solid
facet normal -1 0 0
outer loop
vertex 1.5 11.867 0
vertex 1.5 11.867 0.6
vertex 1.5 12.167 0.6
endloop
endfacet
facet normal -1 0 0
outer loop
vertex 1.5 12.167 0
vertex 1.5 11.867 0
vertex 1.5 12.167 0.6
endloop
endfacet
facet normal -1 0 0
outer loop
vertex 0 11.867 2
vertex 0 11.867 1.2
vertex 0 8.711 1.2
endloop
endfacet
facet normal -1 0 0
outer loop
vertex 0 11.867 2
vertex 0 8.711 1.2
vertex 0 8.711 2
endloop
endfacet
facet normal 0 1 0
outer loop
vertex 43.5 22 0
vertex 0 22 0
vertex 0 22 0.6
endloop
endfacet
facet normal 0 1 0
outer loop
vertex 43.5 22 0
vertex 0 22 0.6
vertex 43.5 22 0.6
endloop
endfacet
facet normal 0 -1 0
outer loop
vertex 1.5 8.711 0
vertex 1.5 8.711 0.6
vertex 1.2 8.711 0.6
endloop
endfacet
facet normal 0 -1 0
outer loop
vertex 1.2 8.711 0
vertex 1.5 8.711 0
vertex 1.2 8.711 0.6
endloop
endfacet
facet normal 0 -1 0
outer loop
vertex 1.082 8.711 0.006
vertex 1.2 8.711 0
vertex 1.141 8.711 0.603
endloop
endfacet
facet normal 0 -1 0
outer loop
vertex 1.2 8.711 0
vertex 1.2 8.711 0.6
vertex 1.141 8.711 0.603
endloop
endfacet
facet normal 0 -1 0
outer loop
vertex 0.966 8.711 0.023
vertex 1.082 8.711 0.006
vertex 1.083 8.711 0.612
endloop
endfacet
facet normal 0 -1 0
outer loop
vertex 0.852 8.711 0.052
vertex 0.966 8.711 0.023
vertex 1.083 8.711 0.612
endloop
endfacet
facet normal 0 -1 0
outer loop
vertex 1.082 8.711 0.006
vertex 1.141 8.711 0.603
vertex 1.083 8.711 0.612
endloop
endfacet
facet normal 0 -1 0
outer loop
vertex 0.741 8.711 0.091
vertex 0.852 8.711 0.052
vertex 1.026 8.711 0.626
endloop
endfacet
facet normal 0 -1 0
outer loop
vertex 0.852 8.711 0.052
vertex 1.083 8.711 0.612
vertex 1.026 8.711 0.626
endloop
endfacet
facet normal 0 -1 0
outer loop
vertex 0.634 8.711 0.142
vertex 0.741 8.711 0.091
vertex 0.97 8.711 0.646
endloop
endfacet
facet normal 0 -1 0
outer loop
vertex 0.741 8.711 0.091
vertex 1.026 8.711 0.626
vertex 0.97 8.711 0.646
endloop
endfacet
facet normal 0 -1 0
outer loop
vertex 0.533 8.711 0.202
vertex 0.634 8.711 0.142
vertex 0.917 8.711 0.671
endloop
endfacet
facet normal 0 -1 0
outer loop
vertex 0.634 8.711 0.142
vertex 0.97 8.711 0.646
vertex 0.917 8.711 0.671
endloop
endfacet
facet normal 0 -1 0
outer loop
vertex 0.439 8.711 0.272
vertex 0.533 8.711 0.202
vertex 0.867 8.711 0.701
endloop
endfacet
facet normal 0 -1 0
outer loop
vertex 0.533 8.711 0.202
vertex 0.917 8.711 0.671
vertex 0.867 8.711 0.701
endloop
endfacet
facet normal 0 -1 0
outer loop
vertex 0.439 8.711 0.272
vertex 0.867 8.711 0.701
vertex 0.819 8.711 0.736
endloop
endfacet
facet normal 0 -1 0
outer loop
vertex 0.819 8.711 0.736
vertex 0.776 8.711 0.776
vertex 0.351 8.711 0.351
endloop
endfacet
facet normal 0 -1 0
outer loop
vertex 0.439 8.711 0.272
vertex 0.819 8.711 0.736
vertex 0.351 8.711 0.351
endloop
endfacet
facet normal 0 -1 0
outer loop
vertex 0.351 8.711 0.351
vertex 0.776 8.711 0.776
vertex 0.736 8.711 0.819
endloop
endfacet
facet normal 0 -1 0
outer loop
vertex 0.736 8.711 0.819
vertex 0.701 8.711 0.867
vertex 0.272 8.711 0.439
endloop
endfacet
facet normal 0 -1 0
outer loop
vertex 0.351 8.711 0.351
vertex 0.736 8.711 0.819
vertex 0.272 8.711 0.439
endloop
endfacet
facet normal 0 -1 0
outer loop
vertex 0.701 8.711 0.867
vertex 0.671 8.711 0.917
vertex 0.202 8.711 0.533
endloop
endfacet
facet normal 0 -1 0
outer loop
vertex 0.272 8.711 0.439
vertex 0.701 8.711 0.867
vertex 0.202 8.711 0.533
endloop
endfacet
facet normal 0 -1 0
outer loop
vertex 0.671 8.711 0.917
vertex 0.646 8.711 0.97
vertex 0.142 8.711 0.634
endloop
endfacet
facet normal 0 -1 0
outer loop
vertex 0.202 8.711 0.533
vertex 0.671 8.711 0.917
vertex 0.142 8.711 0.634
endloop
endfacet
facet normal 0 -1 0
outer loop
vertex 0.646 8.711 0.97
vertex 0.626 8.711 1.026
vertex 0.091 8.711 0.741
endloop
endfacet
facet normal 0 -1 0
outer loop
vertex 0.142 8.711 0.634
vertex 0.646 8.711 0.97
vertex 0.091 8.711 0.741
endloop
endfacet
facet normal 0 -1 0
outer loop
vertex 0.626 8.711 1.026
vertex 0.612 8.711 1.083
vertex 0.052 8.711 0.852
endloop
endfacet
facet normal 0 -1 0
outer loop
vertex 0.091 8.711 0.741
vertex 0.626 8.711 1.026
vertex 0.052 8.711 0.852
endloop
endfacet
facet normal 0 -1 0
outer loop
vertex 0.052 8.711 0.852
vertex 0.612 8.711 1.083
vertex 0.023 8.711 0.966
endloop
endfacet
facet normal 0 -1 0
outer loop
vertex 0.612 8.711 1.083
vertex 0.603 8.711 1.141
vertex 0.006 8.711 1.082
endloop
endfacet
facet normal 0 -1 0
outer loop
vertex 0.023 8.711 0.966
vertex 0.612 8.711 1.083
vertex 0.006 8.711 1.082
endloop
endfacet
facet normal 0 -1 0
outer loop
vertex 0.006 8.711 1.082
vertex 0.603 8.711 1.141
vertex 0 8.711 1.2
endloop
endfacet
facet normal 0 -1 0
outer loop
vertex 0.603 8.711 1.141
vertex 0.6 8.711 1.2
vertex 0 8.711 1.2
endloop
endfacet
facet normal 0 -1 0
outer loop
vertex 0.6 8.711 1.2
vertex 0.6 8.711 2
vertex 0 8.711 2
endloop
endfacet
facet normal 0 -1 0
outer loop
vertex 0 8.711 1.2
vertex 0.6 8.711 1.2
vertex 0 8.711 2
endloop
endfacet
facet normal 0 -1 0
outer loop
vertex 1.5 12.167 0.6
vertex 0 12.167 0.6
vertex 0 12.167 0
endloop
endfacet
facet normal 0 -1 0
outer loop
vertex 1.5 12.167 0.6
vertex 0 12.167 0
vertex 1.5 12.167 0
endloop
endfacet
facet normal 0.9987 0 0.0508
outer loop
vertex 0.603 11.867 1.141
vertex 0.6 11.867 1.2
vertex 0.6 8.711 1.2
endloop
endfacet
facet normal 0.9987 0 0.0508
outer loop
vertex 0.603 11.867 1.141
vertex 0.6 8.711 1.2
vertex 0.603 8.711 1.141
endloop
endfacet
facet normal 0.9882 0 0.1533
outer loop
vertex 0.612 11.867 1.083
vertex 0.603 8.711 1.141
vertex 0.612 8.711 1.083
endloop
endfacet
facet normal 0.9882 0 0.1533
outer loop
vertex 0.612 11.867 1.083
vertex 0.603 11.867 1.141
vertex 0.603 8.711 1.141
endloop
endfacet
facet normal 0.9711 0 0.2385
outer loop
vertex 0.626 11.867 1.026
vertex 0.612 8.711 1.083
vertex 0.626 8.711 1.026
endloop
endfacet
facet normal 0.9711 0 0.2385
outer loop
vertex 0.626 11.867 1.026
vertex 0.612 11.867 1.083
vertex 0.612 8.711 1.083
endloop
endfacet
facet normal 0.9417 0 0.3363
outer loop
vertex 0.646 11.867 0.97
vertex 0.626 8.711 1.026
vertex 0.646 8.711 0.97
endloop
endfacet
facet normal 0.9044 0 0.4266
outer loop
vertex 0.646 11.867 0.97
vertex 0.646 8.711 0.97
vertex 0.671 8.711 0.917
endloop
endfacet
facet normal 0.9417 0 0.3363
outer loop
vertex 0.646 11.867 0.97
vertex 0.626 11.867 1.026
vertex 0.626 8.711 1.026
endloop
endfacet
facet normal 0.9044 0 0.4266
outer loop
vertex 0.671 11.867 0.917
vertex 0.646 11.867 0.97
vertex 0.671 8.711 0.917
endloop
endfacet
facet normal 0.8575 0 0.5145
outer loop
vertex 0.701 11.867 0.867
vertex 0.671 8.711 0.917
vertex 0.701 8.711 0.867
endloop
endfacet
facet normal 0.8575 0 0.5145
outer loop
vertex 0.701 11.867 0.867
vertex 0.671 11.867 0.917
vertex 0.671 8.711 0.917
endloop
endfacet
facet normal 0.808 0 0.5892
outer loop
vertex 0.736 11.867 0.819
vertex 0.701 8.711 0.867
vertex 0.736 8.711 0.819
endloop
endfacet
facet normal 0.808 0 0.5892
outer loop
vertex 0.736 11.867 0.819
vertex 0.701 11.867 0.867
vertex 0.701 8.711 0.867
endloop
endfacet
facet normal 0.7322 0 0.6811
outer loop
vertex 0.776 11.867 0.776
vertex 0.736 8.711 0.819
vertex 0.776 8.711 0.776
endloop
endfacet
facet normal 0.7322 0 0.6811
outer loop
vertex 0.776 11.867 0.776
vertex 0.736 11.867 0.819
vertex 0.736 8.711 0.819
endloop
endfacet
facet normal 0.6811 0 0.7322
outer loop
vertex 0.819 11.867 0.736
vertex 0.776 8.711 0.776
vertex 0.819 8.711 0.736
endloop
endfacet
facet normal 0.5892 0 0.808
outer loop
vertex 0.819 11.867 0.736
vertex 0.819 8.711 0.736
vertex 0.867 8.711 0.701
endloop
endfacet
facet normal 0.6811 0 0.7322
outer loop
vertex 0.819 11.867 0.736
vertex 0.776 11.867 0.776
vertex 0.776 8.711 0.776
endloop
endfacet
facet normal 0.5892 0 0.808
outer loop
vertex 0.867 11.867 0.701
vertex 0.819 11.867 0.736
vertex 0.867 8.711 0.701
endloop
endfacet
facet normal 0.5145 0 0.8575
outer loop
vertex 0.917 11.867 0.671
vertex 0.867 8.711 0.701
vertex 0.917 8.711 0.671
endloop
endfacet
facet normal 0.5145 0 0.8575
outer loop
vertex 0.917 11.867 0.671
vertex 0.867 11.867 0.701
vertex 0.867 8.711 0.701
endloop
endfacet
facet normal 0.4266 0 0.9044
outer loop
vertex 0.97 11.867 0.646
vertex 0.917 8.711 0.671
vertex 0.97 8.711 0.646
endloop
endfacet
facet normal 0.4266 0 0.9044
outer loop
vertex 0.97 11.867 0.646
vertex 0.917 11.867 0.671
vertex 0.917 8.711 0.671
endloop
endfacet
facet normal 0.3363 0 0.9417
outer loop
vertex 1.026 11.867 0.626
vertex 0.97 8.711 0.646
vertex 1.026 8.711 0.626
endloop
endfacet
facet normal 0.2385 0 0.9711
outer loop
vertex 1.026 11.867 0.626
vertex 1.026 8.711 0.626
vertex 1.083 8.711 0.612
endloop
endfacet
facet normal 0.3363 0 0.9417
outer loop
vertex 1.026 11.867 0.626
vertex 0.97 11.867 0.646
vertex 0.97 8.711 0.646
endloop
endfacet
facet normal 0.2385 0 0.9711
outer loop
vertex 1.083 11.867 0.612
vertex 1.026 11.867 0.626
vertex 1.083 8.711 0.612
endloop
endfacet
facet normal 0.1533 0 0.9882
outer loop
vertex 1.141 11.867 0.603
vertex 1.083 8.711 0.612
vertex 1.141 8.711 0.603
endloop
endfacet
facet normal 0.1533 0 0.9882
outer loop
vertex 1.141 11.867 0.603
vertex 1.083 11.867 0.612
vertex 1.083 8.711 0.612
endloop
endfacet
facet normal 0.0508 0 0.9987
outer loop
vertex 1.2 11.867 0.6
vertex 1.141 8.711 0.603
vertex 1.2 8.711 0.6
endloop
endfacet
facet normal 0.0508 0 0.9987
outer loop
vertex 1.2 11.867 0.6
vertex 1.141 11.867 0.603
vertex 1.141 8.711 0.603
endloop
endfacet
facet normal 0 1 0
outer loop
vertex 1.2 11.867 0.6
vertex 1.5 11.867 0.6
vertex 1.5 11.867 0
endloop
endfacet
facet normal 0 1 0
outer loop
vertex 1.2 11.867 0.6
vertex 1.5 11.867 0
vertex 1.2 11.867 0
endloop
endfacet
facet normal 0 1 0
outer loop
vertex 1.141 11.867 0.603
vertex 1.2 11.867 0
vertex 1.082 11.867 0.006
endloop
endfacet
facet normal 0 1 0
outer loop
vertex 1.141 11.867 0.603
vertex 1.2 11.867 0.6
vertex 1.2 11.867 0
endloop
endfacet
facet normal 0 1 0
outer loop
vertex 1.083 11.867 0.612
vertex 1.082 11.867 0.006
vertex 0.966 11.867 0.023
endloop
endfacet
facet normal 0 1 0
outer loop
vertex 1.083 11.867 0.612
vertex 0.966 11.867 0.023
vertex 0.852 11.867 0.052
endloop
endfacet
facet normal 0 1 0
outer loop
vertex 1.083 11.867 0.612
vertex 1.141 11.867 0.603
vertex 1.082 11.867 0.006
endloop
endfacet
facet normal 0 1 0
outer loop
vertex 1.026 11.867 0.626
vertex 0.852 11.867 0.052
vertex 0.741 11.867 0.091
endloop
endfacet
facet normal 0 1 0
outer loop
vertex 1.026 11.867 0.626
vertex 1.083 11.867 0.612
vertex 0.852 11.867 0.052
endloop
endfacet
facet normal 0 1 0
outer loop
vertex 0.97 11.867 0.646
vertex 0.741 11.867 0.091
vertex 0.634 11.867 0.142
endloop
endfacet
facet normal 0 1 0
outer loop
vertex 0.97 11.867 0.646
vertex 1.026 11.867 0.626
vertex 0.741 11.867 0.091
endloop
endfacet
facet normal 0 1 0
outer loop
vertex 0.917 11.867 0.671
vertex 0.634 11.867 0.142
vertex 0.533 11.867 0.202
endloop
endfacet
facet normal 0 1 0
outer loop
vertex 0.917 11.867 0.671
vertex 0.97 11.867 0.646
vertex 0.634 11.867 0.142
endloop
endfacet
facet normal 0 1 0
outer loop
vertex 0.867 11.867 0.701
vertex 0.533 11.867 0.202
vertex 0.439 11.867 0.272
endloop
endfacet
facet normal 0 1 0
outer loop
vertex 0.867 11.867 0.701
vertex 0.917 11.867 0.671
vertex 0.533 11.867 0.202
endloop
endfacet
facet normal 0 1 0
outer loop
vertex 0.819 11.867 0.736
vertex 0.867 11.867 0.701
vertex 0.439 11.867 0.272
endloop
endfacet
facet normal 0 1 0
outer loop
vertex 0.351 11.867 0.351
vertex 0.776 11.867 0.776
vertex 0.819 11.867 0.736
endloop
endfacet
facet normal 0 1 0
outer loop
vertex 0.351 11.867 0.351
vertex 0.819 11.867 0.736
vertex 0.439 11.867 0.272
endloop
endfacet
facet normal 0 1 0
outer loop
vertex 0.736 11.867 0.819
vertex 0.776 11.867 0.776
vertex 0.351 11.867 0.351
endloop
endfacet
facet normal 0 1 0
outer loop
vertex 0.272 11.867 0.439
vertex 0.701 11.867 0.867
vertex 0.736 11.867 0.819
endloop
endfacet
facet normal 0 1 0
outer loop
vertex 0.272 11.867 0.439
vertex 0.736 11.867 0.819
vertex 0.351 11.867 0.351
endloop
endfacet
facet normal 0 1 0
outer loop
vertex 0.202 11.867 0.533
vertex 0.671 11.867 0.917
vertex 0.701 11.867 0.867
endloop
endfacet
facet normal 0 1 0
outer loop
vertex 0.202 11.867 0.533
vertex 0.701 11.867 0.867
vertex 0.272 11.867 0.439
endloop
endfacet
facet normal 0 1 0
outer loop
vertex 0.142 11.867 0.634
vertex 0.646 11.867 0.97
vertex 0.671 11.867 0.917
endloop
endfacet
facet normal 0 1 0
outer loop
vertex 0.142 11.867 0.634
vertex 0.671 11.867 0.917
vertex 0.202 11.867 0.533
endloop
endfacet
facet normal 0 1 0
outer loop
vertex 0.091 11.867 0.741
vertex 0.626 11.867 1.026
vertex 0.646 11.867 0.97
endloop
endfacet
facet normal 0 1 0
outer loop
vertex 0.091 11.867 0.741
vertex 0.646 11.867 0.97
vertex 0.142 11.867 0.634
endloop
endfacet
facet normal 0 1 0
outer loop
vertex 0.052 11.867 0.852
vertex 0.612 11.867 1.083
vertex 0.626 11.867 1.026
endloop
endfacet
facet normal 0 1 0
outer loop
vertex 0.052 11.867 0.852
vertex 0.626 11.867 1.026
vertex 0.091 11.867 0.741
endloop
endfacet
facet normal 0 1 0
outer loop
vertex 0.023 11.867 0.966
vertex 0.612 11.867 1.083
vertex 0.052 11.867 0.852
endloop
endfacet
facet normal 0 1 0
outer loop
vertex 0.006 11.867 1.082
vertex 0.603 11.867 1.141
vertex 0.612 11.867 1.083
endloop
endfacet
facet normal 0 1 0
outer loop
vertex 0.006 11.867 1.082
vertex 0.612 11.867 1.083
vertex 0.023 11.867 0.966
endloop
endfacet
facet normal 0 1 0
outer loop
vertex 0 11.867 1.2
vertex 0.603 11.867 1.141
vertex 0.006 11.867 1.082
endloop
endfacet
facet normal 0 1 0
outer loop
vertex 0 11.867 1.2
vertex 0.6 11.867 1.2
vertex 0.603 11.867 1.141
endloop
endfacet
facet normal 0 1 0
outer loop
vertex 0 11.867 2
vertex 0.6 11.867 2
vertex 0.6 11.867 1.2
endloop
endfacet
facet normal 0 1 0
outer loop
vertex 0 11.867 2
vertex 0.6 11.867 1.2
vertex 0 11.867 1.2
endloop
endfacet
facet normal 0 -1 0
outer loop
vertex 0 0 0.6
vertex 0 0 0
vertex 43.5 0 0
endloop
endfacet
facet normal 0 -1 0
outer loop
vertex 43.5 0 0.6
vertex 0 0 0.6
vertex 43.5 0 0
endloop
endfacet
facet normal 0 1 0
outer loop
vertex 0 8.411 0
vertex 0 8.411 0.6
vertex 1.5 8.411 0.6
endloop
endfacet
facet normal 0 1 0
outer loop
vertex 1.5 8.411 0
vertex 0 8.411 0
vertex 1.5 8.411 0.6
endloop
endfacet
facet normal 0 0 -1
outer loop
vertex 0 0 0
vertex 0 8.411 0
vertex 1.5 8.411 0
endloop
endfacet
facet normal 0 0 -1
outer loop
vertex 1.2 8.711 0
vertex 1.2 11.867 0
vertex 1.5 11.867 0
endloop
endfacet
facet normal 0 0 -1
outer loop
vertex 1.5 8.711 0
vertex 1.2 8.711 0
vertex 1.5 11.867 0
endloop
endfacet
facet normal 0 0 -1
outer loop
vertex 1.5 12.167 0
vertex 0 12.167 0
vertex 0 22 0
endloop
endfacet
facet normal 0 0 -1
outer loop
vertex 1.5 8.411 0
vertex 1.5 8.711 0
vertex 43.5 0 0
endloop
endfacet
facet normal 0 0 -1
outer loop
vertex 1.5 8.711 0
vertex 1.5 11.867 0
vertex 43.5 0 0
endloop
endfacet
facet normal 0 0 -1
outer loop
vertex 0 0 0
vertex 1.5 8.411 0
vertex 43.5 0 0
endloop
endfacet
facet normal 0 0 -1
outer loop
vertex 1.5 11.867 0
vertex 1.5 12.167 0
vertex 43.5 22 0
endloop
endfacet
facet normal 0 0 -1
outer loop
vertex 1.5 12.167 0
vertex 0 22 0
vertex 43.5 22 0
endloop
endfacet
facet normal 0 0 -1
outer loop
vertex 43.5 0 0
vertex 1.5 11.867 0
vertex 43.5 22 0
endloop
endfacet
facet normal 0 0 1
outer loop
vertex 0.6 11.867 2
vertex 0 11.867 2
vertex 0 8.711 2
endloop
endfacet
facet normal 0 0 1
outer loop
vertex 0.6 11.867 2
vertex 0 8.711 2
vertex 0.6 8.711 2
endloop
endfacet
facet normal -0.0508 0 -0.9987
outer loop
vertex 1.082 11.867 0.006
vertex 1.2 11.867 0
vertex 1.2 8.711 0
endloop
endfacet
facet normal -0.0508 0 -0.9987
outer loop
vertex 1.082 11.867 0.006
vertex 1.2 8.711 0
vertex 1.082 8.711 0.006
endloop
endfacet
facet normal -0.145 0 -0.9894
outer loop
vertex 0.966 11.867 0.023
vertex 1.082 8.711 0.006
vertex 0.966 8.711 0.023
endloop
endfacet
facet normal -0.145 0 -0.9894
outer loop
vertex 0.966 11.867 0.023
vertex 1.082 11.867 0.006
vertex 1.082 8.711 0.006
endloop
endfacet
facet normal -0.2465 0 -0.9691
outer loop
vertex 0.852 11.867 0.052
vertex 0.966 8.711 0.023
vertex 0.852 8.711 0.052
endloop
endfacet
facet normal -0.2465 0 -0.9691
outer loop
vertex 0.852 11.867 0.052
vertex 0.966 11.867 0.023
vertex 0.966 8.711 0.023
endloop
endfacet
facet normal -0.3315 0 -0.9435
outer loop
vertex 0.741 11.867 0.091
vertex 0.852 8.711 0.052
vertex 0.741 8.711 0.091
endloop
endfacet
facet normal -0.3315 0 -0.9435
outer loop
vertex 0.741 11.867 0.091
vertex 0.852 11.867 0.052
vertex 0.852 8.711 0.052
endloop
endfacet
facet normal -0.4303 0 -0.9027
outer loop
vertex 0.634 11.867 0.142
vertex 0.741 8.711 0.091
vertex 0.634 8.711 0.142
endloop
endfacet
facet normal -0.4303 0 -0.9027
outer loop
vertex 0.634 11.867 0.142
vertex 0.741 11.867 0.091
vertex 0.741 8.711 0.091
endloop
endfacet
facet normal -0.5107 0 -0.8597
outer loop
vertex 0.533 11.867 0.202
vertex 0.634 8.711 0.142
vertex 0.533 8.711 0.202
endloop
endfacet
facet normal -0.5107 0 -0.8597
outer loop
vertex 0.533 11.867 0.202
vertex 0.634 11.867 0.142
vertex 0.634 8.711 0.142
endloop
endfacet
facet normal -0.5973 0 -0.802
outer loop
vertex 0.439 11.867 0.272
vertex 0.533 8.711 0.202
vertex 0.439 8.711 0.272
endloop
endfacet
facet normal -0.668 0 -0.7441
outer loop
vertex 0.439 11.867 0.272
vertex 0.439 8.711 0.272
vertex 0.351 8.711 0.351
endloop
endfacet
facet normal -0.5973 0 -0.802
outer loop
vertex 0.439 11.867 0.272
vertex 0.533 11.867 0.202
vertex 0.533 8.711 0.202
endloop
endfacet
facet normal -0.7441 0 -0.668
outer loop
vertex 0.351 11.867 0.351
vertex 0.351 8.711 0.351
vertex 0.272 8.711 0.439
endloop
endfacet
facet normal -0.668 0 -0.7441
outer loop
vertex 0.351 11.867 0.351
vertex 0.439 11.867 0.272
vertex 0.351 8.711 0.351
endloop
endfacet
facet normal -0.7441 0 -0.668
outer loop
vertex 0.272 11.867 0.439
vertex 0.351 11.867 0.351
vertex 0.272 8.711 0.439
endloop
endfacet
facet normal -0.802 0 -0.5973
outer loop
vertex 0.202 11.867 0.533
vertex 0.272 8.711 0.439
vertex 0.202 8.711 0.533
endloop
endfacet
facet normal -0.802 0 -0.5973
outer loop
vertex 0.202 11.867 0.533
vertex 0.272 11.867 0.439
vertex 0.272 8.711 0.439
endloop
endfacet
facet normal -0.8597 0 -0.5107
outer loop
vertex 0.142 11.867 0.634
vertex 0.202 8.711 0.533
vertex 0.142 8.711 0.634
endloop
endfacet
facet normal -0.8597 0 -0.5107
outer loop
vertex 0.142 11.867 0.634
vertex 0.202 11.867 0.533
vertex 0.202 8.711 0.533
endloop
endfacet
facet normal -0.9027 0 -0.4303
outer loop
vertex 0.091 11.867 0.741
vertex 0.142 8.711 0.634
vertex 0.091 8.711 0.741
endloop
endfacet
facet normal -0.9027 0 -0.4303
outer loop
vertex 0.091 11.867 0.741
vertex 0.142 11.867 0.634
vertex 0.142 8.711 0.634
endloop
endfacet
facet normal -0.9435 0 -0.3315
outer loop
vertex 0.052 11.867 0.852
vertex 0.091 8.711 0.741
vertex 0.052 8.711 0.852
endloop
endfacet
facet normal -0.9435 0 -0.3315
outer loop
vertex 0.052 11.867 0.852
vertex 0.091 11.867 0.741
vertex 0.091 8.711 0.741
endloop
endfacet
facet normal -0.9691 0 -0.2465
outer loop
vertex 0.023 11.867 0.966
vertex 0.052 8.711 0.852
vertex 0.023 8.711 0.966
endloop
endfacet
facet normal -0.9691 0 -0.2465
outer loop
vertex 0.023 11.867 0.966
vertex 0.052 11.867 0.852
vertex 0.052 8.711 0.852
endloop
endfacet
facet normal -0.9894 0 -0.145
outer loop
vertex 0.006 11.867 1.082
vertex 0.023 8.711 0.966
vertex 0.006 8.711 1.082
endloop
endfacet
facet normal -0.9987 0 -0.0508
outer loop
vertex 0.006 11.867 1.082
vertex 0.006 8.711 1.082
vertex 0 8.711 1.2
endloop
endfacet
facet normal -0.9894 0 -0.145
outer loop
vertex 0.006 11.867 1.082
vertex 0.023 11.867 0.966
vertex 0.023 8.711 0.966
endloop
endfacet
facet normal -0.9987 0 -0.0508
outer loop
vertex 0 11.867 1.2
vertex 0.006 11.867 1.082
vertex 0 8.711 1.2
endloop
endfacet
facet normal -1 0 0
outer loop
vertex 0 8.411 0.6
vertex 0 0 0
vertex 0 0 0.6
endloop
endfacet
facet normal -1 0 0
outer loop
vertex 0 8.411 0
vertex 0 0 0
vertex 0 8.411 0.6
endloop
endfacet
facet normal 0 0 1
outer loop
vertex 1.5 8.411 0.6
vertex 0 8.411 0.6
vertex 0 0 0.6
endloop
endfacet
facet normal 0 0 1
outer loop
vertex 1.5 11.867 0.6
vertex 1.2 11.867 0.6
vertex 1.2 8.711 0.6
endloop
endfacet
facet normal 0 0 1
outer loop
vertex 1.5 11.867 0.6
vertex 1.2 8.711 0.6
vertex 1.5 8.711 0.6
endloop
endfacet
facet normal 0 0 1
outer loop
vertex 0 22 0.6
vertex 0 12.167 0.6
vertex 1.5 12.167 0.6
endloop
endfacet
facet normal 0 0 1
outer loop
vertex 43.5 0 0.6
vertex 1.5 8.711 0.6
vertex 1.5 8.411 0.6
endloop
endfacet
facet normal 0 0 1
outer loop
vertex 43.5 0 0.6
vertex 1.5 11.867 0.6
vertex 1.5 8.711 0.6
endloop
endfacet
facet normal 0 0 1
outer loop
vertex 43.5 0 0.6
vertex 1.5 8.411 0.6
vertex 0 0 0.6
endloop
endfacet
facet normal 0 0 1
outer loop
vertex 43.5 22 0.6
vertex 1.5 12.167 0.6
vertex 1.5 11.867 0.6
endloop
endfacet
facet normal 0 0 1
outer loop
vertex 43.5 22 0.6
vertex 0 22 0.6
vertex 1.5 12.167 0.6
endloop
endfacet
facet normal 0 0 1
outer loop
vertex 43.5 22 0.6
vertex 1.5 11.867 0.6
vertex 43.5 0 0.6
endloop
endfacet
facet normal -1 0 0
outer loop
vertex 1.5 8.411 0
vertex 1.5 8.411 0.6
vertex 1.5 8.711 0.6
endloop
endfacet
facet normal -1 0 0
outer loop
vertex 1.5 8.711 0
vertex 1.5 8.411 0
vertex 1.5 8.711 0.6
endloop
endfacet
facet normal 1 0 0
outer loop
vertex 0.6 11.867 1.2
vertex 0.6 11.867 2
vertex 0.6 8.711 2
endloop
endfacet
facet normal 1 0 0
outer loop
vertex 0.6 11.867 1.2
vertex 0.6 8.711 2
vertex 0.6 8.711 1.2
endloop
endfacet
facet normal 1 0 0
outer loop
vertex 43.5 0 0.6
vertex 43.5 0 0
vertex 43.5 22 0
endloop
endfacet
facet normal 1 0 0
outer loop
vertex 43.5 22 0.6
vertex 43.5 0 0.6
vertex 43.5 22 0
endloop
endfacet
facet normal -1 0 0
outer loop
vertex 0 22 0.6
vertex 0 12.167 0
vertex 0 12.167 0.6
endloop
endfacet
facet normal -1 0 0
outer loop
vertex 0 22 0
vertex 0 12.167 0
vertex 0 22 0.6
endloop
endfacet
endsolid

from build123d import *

# Parameters (mm, degrees)
SKETCH3_W                     = 43.5
SKETCH3_H                     = 22
BOSS_EXTRUDE3_DEPTH           = 0.6
EDGE_FLANGE1_STRIP_W          = 3.6
EDGE_FLANGE1_STRIP_H          = 0.6
EDGE_FLANGE1_STRIP_CUT_DEPTH  = 3.155767649
EDGE_FLANGE1_RELIEF_W         = 3.9
EDGE_FLANGE1_RELIEF_H         = 0.3
EDGE_FLANGE1_RELIEF_CUT_DEPTH = 0.6
EDGE_FLANGE1_DEPTH            = 3.155767649


# Sheet-metal steps are written as plain solids
with BuildPart() as part:
    # Sketch3 → Boss-Extrude3 (new body)
    with BuildSketch(Plane.XY):
        with Locations((21.75, 11)):
            Rectangle(SKETCH3_W, SKETCH3_H)
    extrude(amount=BOSS_EXTRUDE3_DEPTH)

    # Edge-Flange1 strip (across the edge) → Edge-Flange1 strip cut (cut)
    with BuildSketch(Plane(origin=(0, 11.866760766, 0.6), x_dir=(1, 0, 0), z_dir=(0, -1, 0))):
        with Locations((-0.6, -0.3)):
            Rectangle(EDGE_FLANGE1_STRIP_W, EDGE_FLANGE1_STRIP_H)
    extrude(amount=EDGE_FLANGE1_STRIP_CUT_DEPTH, mode=Mode.SUBTRACT)

    # Edge-Flange1 relief (on the sheet) → Edge-Flange1 relief cut (cut)
    with BuildSketch(Plane(origin=(1.2, 11.866760766, 0.6), x_dir=(1, 0, 0), z_dir=(0, 0, 1))):
        with Locations((-1.65, 0.15)):
            Rectangle(EDGE_FLANGE1_RELIEF_W, EDGE_FLANGE1_RELIEF_H)
        with Locations((-1.65, -3.305767649)):
            Rectangle(EDGE_FLANGE1_RELIEF_W, EDGE_FLANGE1_RELIEF_H)
    extrude(amount=-EDGE_FLANGE1_RELIEF_CUT_DEPTH, mode=Mode.SUBTRACT)

    # Edge-Flange1 section (across the edge) → Edge-Flange1 (add)
    with BuildSketch(Plane(origin=(0, 11.866760766, 0.6), x_dir=(1, 0, 0), z_dir=(0, -1, 0))):
        with BuildLine():
            Line((0, 0.6), (0, 1.4))
            Line((0, 1.4), (0.6, 1.4))
            Line((0.6, 1.4), (0.6, 0.6))
            ThreePointArc((0.6, 0.6), (0.775735931, 0.175735931), (1.2, 0))
            Line((1.2, 0), (1.2, -0.6))
            ThreePointArc((1.2, -0.6), (0.351471863, -0.248528137), (0, 0.6))
        make_face()
    extrude(amount=EDGE_FLANGE1_DEPTH)


solid = part.part
